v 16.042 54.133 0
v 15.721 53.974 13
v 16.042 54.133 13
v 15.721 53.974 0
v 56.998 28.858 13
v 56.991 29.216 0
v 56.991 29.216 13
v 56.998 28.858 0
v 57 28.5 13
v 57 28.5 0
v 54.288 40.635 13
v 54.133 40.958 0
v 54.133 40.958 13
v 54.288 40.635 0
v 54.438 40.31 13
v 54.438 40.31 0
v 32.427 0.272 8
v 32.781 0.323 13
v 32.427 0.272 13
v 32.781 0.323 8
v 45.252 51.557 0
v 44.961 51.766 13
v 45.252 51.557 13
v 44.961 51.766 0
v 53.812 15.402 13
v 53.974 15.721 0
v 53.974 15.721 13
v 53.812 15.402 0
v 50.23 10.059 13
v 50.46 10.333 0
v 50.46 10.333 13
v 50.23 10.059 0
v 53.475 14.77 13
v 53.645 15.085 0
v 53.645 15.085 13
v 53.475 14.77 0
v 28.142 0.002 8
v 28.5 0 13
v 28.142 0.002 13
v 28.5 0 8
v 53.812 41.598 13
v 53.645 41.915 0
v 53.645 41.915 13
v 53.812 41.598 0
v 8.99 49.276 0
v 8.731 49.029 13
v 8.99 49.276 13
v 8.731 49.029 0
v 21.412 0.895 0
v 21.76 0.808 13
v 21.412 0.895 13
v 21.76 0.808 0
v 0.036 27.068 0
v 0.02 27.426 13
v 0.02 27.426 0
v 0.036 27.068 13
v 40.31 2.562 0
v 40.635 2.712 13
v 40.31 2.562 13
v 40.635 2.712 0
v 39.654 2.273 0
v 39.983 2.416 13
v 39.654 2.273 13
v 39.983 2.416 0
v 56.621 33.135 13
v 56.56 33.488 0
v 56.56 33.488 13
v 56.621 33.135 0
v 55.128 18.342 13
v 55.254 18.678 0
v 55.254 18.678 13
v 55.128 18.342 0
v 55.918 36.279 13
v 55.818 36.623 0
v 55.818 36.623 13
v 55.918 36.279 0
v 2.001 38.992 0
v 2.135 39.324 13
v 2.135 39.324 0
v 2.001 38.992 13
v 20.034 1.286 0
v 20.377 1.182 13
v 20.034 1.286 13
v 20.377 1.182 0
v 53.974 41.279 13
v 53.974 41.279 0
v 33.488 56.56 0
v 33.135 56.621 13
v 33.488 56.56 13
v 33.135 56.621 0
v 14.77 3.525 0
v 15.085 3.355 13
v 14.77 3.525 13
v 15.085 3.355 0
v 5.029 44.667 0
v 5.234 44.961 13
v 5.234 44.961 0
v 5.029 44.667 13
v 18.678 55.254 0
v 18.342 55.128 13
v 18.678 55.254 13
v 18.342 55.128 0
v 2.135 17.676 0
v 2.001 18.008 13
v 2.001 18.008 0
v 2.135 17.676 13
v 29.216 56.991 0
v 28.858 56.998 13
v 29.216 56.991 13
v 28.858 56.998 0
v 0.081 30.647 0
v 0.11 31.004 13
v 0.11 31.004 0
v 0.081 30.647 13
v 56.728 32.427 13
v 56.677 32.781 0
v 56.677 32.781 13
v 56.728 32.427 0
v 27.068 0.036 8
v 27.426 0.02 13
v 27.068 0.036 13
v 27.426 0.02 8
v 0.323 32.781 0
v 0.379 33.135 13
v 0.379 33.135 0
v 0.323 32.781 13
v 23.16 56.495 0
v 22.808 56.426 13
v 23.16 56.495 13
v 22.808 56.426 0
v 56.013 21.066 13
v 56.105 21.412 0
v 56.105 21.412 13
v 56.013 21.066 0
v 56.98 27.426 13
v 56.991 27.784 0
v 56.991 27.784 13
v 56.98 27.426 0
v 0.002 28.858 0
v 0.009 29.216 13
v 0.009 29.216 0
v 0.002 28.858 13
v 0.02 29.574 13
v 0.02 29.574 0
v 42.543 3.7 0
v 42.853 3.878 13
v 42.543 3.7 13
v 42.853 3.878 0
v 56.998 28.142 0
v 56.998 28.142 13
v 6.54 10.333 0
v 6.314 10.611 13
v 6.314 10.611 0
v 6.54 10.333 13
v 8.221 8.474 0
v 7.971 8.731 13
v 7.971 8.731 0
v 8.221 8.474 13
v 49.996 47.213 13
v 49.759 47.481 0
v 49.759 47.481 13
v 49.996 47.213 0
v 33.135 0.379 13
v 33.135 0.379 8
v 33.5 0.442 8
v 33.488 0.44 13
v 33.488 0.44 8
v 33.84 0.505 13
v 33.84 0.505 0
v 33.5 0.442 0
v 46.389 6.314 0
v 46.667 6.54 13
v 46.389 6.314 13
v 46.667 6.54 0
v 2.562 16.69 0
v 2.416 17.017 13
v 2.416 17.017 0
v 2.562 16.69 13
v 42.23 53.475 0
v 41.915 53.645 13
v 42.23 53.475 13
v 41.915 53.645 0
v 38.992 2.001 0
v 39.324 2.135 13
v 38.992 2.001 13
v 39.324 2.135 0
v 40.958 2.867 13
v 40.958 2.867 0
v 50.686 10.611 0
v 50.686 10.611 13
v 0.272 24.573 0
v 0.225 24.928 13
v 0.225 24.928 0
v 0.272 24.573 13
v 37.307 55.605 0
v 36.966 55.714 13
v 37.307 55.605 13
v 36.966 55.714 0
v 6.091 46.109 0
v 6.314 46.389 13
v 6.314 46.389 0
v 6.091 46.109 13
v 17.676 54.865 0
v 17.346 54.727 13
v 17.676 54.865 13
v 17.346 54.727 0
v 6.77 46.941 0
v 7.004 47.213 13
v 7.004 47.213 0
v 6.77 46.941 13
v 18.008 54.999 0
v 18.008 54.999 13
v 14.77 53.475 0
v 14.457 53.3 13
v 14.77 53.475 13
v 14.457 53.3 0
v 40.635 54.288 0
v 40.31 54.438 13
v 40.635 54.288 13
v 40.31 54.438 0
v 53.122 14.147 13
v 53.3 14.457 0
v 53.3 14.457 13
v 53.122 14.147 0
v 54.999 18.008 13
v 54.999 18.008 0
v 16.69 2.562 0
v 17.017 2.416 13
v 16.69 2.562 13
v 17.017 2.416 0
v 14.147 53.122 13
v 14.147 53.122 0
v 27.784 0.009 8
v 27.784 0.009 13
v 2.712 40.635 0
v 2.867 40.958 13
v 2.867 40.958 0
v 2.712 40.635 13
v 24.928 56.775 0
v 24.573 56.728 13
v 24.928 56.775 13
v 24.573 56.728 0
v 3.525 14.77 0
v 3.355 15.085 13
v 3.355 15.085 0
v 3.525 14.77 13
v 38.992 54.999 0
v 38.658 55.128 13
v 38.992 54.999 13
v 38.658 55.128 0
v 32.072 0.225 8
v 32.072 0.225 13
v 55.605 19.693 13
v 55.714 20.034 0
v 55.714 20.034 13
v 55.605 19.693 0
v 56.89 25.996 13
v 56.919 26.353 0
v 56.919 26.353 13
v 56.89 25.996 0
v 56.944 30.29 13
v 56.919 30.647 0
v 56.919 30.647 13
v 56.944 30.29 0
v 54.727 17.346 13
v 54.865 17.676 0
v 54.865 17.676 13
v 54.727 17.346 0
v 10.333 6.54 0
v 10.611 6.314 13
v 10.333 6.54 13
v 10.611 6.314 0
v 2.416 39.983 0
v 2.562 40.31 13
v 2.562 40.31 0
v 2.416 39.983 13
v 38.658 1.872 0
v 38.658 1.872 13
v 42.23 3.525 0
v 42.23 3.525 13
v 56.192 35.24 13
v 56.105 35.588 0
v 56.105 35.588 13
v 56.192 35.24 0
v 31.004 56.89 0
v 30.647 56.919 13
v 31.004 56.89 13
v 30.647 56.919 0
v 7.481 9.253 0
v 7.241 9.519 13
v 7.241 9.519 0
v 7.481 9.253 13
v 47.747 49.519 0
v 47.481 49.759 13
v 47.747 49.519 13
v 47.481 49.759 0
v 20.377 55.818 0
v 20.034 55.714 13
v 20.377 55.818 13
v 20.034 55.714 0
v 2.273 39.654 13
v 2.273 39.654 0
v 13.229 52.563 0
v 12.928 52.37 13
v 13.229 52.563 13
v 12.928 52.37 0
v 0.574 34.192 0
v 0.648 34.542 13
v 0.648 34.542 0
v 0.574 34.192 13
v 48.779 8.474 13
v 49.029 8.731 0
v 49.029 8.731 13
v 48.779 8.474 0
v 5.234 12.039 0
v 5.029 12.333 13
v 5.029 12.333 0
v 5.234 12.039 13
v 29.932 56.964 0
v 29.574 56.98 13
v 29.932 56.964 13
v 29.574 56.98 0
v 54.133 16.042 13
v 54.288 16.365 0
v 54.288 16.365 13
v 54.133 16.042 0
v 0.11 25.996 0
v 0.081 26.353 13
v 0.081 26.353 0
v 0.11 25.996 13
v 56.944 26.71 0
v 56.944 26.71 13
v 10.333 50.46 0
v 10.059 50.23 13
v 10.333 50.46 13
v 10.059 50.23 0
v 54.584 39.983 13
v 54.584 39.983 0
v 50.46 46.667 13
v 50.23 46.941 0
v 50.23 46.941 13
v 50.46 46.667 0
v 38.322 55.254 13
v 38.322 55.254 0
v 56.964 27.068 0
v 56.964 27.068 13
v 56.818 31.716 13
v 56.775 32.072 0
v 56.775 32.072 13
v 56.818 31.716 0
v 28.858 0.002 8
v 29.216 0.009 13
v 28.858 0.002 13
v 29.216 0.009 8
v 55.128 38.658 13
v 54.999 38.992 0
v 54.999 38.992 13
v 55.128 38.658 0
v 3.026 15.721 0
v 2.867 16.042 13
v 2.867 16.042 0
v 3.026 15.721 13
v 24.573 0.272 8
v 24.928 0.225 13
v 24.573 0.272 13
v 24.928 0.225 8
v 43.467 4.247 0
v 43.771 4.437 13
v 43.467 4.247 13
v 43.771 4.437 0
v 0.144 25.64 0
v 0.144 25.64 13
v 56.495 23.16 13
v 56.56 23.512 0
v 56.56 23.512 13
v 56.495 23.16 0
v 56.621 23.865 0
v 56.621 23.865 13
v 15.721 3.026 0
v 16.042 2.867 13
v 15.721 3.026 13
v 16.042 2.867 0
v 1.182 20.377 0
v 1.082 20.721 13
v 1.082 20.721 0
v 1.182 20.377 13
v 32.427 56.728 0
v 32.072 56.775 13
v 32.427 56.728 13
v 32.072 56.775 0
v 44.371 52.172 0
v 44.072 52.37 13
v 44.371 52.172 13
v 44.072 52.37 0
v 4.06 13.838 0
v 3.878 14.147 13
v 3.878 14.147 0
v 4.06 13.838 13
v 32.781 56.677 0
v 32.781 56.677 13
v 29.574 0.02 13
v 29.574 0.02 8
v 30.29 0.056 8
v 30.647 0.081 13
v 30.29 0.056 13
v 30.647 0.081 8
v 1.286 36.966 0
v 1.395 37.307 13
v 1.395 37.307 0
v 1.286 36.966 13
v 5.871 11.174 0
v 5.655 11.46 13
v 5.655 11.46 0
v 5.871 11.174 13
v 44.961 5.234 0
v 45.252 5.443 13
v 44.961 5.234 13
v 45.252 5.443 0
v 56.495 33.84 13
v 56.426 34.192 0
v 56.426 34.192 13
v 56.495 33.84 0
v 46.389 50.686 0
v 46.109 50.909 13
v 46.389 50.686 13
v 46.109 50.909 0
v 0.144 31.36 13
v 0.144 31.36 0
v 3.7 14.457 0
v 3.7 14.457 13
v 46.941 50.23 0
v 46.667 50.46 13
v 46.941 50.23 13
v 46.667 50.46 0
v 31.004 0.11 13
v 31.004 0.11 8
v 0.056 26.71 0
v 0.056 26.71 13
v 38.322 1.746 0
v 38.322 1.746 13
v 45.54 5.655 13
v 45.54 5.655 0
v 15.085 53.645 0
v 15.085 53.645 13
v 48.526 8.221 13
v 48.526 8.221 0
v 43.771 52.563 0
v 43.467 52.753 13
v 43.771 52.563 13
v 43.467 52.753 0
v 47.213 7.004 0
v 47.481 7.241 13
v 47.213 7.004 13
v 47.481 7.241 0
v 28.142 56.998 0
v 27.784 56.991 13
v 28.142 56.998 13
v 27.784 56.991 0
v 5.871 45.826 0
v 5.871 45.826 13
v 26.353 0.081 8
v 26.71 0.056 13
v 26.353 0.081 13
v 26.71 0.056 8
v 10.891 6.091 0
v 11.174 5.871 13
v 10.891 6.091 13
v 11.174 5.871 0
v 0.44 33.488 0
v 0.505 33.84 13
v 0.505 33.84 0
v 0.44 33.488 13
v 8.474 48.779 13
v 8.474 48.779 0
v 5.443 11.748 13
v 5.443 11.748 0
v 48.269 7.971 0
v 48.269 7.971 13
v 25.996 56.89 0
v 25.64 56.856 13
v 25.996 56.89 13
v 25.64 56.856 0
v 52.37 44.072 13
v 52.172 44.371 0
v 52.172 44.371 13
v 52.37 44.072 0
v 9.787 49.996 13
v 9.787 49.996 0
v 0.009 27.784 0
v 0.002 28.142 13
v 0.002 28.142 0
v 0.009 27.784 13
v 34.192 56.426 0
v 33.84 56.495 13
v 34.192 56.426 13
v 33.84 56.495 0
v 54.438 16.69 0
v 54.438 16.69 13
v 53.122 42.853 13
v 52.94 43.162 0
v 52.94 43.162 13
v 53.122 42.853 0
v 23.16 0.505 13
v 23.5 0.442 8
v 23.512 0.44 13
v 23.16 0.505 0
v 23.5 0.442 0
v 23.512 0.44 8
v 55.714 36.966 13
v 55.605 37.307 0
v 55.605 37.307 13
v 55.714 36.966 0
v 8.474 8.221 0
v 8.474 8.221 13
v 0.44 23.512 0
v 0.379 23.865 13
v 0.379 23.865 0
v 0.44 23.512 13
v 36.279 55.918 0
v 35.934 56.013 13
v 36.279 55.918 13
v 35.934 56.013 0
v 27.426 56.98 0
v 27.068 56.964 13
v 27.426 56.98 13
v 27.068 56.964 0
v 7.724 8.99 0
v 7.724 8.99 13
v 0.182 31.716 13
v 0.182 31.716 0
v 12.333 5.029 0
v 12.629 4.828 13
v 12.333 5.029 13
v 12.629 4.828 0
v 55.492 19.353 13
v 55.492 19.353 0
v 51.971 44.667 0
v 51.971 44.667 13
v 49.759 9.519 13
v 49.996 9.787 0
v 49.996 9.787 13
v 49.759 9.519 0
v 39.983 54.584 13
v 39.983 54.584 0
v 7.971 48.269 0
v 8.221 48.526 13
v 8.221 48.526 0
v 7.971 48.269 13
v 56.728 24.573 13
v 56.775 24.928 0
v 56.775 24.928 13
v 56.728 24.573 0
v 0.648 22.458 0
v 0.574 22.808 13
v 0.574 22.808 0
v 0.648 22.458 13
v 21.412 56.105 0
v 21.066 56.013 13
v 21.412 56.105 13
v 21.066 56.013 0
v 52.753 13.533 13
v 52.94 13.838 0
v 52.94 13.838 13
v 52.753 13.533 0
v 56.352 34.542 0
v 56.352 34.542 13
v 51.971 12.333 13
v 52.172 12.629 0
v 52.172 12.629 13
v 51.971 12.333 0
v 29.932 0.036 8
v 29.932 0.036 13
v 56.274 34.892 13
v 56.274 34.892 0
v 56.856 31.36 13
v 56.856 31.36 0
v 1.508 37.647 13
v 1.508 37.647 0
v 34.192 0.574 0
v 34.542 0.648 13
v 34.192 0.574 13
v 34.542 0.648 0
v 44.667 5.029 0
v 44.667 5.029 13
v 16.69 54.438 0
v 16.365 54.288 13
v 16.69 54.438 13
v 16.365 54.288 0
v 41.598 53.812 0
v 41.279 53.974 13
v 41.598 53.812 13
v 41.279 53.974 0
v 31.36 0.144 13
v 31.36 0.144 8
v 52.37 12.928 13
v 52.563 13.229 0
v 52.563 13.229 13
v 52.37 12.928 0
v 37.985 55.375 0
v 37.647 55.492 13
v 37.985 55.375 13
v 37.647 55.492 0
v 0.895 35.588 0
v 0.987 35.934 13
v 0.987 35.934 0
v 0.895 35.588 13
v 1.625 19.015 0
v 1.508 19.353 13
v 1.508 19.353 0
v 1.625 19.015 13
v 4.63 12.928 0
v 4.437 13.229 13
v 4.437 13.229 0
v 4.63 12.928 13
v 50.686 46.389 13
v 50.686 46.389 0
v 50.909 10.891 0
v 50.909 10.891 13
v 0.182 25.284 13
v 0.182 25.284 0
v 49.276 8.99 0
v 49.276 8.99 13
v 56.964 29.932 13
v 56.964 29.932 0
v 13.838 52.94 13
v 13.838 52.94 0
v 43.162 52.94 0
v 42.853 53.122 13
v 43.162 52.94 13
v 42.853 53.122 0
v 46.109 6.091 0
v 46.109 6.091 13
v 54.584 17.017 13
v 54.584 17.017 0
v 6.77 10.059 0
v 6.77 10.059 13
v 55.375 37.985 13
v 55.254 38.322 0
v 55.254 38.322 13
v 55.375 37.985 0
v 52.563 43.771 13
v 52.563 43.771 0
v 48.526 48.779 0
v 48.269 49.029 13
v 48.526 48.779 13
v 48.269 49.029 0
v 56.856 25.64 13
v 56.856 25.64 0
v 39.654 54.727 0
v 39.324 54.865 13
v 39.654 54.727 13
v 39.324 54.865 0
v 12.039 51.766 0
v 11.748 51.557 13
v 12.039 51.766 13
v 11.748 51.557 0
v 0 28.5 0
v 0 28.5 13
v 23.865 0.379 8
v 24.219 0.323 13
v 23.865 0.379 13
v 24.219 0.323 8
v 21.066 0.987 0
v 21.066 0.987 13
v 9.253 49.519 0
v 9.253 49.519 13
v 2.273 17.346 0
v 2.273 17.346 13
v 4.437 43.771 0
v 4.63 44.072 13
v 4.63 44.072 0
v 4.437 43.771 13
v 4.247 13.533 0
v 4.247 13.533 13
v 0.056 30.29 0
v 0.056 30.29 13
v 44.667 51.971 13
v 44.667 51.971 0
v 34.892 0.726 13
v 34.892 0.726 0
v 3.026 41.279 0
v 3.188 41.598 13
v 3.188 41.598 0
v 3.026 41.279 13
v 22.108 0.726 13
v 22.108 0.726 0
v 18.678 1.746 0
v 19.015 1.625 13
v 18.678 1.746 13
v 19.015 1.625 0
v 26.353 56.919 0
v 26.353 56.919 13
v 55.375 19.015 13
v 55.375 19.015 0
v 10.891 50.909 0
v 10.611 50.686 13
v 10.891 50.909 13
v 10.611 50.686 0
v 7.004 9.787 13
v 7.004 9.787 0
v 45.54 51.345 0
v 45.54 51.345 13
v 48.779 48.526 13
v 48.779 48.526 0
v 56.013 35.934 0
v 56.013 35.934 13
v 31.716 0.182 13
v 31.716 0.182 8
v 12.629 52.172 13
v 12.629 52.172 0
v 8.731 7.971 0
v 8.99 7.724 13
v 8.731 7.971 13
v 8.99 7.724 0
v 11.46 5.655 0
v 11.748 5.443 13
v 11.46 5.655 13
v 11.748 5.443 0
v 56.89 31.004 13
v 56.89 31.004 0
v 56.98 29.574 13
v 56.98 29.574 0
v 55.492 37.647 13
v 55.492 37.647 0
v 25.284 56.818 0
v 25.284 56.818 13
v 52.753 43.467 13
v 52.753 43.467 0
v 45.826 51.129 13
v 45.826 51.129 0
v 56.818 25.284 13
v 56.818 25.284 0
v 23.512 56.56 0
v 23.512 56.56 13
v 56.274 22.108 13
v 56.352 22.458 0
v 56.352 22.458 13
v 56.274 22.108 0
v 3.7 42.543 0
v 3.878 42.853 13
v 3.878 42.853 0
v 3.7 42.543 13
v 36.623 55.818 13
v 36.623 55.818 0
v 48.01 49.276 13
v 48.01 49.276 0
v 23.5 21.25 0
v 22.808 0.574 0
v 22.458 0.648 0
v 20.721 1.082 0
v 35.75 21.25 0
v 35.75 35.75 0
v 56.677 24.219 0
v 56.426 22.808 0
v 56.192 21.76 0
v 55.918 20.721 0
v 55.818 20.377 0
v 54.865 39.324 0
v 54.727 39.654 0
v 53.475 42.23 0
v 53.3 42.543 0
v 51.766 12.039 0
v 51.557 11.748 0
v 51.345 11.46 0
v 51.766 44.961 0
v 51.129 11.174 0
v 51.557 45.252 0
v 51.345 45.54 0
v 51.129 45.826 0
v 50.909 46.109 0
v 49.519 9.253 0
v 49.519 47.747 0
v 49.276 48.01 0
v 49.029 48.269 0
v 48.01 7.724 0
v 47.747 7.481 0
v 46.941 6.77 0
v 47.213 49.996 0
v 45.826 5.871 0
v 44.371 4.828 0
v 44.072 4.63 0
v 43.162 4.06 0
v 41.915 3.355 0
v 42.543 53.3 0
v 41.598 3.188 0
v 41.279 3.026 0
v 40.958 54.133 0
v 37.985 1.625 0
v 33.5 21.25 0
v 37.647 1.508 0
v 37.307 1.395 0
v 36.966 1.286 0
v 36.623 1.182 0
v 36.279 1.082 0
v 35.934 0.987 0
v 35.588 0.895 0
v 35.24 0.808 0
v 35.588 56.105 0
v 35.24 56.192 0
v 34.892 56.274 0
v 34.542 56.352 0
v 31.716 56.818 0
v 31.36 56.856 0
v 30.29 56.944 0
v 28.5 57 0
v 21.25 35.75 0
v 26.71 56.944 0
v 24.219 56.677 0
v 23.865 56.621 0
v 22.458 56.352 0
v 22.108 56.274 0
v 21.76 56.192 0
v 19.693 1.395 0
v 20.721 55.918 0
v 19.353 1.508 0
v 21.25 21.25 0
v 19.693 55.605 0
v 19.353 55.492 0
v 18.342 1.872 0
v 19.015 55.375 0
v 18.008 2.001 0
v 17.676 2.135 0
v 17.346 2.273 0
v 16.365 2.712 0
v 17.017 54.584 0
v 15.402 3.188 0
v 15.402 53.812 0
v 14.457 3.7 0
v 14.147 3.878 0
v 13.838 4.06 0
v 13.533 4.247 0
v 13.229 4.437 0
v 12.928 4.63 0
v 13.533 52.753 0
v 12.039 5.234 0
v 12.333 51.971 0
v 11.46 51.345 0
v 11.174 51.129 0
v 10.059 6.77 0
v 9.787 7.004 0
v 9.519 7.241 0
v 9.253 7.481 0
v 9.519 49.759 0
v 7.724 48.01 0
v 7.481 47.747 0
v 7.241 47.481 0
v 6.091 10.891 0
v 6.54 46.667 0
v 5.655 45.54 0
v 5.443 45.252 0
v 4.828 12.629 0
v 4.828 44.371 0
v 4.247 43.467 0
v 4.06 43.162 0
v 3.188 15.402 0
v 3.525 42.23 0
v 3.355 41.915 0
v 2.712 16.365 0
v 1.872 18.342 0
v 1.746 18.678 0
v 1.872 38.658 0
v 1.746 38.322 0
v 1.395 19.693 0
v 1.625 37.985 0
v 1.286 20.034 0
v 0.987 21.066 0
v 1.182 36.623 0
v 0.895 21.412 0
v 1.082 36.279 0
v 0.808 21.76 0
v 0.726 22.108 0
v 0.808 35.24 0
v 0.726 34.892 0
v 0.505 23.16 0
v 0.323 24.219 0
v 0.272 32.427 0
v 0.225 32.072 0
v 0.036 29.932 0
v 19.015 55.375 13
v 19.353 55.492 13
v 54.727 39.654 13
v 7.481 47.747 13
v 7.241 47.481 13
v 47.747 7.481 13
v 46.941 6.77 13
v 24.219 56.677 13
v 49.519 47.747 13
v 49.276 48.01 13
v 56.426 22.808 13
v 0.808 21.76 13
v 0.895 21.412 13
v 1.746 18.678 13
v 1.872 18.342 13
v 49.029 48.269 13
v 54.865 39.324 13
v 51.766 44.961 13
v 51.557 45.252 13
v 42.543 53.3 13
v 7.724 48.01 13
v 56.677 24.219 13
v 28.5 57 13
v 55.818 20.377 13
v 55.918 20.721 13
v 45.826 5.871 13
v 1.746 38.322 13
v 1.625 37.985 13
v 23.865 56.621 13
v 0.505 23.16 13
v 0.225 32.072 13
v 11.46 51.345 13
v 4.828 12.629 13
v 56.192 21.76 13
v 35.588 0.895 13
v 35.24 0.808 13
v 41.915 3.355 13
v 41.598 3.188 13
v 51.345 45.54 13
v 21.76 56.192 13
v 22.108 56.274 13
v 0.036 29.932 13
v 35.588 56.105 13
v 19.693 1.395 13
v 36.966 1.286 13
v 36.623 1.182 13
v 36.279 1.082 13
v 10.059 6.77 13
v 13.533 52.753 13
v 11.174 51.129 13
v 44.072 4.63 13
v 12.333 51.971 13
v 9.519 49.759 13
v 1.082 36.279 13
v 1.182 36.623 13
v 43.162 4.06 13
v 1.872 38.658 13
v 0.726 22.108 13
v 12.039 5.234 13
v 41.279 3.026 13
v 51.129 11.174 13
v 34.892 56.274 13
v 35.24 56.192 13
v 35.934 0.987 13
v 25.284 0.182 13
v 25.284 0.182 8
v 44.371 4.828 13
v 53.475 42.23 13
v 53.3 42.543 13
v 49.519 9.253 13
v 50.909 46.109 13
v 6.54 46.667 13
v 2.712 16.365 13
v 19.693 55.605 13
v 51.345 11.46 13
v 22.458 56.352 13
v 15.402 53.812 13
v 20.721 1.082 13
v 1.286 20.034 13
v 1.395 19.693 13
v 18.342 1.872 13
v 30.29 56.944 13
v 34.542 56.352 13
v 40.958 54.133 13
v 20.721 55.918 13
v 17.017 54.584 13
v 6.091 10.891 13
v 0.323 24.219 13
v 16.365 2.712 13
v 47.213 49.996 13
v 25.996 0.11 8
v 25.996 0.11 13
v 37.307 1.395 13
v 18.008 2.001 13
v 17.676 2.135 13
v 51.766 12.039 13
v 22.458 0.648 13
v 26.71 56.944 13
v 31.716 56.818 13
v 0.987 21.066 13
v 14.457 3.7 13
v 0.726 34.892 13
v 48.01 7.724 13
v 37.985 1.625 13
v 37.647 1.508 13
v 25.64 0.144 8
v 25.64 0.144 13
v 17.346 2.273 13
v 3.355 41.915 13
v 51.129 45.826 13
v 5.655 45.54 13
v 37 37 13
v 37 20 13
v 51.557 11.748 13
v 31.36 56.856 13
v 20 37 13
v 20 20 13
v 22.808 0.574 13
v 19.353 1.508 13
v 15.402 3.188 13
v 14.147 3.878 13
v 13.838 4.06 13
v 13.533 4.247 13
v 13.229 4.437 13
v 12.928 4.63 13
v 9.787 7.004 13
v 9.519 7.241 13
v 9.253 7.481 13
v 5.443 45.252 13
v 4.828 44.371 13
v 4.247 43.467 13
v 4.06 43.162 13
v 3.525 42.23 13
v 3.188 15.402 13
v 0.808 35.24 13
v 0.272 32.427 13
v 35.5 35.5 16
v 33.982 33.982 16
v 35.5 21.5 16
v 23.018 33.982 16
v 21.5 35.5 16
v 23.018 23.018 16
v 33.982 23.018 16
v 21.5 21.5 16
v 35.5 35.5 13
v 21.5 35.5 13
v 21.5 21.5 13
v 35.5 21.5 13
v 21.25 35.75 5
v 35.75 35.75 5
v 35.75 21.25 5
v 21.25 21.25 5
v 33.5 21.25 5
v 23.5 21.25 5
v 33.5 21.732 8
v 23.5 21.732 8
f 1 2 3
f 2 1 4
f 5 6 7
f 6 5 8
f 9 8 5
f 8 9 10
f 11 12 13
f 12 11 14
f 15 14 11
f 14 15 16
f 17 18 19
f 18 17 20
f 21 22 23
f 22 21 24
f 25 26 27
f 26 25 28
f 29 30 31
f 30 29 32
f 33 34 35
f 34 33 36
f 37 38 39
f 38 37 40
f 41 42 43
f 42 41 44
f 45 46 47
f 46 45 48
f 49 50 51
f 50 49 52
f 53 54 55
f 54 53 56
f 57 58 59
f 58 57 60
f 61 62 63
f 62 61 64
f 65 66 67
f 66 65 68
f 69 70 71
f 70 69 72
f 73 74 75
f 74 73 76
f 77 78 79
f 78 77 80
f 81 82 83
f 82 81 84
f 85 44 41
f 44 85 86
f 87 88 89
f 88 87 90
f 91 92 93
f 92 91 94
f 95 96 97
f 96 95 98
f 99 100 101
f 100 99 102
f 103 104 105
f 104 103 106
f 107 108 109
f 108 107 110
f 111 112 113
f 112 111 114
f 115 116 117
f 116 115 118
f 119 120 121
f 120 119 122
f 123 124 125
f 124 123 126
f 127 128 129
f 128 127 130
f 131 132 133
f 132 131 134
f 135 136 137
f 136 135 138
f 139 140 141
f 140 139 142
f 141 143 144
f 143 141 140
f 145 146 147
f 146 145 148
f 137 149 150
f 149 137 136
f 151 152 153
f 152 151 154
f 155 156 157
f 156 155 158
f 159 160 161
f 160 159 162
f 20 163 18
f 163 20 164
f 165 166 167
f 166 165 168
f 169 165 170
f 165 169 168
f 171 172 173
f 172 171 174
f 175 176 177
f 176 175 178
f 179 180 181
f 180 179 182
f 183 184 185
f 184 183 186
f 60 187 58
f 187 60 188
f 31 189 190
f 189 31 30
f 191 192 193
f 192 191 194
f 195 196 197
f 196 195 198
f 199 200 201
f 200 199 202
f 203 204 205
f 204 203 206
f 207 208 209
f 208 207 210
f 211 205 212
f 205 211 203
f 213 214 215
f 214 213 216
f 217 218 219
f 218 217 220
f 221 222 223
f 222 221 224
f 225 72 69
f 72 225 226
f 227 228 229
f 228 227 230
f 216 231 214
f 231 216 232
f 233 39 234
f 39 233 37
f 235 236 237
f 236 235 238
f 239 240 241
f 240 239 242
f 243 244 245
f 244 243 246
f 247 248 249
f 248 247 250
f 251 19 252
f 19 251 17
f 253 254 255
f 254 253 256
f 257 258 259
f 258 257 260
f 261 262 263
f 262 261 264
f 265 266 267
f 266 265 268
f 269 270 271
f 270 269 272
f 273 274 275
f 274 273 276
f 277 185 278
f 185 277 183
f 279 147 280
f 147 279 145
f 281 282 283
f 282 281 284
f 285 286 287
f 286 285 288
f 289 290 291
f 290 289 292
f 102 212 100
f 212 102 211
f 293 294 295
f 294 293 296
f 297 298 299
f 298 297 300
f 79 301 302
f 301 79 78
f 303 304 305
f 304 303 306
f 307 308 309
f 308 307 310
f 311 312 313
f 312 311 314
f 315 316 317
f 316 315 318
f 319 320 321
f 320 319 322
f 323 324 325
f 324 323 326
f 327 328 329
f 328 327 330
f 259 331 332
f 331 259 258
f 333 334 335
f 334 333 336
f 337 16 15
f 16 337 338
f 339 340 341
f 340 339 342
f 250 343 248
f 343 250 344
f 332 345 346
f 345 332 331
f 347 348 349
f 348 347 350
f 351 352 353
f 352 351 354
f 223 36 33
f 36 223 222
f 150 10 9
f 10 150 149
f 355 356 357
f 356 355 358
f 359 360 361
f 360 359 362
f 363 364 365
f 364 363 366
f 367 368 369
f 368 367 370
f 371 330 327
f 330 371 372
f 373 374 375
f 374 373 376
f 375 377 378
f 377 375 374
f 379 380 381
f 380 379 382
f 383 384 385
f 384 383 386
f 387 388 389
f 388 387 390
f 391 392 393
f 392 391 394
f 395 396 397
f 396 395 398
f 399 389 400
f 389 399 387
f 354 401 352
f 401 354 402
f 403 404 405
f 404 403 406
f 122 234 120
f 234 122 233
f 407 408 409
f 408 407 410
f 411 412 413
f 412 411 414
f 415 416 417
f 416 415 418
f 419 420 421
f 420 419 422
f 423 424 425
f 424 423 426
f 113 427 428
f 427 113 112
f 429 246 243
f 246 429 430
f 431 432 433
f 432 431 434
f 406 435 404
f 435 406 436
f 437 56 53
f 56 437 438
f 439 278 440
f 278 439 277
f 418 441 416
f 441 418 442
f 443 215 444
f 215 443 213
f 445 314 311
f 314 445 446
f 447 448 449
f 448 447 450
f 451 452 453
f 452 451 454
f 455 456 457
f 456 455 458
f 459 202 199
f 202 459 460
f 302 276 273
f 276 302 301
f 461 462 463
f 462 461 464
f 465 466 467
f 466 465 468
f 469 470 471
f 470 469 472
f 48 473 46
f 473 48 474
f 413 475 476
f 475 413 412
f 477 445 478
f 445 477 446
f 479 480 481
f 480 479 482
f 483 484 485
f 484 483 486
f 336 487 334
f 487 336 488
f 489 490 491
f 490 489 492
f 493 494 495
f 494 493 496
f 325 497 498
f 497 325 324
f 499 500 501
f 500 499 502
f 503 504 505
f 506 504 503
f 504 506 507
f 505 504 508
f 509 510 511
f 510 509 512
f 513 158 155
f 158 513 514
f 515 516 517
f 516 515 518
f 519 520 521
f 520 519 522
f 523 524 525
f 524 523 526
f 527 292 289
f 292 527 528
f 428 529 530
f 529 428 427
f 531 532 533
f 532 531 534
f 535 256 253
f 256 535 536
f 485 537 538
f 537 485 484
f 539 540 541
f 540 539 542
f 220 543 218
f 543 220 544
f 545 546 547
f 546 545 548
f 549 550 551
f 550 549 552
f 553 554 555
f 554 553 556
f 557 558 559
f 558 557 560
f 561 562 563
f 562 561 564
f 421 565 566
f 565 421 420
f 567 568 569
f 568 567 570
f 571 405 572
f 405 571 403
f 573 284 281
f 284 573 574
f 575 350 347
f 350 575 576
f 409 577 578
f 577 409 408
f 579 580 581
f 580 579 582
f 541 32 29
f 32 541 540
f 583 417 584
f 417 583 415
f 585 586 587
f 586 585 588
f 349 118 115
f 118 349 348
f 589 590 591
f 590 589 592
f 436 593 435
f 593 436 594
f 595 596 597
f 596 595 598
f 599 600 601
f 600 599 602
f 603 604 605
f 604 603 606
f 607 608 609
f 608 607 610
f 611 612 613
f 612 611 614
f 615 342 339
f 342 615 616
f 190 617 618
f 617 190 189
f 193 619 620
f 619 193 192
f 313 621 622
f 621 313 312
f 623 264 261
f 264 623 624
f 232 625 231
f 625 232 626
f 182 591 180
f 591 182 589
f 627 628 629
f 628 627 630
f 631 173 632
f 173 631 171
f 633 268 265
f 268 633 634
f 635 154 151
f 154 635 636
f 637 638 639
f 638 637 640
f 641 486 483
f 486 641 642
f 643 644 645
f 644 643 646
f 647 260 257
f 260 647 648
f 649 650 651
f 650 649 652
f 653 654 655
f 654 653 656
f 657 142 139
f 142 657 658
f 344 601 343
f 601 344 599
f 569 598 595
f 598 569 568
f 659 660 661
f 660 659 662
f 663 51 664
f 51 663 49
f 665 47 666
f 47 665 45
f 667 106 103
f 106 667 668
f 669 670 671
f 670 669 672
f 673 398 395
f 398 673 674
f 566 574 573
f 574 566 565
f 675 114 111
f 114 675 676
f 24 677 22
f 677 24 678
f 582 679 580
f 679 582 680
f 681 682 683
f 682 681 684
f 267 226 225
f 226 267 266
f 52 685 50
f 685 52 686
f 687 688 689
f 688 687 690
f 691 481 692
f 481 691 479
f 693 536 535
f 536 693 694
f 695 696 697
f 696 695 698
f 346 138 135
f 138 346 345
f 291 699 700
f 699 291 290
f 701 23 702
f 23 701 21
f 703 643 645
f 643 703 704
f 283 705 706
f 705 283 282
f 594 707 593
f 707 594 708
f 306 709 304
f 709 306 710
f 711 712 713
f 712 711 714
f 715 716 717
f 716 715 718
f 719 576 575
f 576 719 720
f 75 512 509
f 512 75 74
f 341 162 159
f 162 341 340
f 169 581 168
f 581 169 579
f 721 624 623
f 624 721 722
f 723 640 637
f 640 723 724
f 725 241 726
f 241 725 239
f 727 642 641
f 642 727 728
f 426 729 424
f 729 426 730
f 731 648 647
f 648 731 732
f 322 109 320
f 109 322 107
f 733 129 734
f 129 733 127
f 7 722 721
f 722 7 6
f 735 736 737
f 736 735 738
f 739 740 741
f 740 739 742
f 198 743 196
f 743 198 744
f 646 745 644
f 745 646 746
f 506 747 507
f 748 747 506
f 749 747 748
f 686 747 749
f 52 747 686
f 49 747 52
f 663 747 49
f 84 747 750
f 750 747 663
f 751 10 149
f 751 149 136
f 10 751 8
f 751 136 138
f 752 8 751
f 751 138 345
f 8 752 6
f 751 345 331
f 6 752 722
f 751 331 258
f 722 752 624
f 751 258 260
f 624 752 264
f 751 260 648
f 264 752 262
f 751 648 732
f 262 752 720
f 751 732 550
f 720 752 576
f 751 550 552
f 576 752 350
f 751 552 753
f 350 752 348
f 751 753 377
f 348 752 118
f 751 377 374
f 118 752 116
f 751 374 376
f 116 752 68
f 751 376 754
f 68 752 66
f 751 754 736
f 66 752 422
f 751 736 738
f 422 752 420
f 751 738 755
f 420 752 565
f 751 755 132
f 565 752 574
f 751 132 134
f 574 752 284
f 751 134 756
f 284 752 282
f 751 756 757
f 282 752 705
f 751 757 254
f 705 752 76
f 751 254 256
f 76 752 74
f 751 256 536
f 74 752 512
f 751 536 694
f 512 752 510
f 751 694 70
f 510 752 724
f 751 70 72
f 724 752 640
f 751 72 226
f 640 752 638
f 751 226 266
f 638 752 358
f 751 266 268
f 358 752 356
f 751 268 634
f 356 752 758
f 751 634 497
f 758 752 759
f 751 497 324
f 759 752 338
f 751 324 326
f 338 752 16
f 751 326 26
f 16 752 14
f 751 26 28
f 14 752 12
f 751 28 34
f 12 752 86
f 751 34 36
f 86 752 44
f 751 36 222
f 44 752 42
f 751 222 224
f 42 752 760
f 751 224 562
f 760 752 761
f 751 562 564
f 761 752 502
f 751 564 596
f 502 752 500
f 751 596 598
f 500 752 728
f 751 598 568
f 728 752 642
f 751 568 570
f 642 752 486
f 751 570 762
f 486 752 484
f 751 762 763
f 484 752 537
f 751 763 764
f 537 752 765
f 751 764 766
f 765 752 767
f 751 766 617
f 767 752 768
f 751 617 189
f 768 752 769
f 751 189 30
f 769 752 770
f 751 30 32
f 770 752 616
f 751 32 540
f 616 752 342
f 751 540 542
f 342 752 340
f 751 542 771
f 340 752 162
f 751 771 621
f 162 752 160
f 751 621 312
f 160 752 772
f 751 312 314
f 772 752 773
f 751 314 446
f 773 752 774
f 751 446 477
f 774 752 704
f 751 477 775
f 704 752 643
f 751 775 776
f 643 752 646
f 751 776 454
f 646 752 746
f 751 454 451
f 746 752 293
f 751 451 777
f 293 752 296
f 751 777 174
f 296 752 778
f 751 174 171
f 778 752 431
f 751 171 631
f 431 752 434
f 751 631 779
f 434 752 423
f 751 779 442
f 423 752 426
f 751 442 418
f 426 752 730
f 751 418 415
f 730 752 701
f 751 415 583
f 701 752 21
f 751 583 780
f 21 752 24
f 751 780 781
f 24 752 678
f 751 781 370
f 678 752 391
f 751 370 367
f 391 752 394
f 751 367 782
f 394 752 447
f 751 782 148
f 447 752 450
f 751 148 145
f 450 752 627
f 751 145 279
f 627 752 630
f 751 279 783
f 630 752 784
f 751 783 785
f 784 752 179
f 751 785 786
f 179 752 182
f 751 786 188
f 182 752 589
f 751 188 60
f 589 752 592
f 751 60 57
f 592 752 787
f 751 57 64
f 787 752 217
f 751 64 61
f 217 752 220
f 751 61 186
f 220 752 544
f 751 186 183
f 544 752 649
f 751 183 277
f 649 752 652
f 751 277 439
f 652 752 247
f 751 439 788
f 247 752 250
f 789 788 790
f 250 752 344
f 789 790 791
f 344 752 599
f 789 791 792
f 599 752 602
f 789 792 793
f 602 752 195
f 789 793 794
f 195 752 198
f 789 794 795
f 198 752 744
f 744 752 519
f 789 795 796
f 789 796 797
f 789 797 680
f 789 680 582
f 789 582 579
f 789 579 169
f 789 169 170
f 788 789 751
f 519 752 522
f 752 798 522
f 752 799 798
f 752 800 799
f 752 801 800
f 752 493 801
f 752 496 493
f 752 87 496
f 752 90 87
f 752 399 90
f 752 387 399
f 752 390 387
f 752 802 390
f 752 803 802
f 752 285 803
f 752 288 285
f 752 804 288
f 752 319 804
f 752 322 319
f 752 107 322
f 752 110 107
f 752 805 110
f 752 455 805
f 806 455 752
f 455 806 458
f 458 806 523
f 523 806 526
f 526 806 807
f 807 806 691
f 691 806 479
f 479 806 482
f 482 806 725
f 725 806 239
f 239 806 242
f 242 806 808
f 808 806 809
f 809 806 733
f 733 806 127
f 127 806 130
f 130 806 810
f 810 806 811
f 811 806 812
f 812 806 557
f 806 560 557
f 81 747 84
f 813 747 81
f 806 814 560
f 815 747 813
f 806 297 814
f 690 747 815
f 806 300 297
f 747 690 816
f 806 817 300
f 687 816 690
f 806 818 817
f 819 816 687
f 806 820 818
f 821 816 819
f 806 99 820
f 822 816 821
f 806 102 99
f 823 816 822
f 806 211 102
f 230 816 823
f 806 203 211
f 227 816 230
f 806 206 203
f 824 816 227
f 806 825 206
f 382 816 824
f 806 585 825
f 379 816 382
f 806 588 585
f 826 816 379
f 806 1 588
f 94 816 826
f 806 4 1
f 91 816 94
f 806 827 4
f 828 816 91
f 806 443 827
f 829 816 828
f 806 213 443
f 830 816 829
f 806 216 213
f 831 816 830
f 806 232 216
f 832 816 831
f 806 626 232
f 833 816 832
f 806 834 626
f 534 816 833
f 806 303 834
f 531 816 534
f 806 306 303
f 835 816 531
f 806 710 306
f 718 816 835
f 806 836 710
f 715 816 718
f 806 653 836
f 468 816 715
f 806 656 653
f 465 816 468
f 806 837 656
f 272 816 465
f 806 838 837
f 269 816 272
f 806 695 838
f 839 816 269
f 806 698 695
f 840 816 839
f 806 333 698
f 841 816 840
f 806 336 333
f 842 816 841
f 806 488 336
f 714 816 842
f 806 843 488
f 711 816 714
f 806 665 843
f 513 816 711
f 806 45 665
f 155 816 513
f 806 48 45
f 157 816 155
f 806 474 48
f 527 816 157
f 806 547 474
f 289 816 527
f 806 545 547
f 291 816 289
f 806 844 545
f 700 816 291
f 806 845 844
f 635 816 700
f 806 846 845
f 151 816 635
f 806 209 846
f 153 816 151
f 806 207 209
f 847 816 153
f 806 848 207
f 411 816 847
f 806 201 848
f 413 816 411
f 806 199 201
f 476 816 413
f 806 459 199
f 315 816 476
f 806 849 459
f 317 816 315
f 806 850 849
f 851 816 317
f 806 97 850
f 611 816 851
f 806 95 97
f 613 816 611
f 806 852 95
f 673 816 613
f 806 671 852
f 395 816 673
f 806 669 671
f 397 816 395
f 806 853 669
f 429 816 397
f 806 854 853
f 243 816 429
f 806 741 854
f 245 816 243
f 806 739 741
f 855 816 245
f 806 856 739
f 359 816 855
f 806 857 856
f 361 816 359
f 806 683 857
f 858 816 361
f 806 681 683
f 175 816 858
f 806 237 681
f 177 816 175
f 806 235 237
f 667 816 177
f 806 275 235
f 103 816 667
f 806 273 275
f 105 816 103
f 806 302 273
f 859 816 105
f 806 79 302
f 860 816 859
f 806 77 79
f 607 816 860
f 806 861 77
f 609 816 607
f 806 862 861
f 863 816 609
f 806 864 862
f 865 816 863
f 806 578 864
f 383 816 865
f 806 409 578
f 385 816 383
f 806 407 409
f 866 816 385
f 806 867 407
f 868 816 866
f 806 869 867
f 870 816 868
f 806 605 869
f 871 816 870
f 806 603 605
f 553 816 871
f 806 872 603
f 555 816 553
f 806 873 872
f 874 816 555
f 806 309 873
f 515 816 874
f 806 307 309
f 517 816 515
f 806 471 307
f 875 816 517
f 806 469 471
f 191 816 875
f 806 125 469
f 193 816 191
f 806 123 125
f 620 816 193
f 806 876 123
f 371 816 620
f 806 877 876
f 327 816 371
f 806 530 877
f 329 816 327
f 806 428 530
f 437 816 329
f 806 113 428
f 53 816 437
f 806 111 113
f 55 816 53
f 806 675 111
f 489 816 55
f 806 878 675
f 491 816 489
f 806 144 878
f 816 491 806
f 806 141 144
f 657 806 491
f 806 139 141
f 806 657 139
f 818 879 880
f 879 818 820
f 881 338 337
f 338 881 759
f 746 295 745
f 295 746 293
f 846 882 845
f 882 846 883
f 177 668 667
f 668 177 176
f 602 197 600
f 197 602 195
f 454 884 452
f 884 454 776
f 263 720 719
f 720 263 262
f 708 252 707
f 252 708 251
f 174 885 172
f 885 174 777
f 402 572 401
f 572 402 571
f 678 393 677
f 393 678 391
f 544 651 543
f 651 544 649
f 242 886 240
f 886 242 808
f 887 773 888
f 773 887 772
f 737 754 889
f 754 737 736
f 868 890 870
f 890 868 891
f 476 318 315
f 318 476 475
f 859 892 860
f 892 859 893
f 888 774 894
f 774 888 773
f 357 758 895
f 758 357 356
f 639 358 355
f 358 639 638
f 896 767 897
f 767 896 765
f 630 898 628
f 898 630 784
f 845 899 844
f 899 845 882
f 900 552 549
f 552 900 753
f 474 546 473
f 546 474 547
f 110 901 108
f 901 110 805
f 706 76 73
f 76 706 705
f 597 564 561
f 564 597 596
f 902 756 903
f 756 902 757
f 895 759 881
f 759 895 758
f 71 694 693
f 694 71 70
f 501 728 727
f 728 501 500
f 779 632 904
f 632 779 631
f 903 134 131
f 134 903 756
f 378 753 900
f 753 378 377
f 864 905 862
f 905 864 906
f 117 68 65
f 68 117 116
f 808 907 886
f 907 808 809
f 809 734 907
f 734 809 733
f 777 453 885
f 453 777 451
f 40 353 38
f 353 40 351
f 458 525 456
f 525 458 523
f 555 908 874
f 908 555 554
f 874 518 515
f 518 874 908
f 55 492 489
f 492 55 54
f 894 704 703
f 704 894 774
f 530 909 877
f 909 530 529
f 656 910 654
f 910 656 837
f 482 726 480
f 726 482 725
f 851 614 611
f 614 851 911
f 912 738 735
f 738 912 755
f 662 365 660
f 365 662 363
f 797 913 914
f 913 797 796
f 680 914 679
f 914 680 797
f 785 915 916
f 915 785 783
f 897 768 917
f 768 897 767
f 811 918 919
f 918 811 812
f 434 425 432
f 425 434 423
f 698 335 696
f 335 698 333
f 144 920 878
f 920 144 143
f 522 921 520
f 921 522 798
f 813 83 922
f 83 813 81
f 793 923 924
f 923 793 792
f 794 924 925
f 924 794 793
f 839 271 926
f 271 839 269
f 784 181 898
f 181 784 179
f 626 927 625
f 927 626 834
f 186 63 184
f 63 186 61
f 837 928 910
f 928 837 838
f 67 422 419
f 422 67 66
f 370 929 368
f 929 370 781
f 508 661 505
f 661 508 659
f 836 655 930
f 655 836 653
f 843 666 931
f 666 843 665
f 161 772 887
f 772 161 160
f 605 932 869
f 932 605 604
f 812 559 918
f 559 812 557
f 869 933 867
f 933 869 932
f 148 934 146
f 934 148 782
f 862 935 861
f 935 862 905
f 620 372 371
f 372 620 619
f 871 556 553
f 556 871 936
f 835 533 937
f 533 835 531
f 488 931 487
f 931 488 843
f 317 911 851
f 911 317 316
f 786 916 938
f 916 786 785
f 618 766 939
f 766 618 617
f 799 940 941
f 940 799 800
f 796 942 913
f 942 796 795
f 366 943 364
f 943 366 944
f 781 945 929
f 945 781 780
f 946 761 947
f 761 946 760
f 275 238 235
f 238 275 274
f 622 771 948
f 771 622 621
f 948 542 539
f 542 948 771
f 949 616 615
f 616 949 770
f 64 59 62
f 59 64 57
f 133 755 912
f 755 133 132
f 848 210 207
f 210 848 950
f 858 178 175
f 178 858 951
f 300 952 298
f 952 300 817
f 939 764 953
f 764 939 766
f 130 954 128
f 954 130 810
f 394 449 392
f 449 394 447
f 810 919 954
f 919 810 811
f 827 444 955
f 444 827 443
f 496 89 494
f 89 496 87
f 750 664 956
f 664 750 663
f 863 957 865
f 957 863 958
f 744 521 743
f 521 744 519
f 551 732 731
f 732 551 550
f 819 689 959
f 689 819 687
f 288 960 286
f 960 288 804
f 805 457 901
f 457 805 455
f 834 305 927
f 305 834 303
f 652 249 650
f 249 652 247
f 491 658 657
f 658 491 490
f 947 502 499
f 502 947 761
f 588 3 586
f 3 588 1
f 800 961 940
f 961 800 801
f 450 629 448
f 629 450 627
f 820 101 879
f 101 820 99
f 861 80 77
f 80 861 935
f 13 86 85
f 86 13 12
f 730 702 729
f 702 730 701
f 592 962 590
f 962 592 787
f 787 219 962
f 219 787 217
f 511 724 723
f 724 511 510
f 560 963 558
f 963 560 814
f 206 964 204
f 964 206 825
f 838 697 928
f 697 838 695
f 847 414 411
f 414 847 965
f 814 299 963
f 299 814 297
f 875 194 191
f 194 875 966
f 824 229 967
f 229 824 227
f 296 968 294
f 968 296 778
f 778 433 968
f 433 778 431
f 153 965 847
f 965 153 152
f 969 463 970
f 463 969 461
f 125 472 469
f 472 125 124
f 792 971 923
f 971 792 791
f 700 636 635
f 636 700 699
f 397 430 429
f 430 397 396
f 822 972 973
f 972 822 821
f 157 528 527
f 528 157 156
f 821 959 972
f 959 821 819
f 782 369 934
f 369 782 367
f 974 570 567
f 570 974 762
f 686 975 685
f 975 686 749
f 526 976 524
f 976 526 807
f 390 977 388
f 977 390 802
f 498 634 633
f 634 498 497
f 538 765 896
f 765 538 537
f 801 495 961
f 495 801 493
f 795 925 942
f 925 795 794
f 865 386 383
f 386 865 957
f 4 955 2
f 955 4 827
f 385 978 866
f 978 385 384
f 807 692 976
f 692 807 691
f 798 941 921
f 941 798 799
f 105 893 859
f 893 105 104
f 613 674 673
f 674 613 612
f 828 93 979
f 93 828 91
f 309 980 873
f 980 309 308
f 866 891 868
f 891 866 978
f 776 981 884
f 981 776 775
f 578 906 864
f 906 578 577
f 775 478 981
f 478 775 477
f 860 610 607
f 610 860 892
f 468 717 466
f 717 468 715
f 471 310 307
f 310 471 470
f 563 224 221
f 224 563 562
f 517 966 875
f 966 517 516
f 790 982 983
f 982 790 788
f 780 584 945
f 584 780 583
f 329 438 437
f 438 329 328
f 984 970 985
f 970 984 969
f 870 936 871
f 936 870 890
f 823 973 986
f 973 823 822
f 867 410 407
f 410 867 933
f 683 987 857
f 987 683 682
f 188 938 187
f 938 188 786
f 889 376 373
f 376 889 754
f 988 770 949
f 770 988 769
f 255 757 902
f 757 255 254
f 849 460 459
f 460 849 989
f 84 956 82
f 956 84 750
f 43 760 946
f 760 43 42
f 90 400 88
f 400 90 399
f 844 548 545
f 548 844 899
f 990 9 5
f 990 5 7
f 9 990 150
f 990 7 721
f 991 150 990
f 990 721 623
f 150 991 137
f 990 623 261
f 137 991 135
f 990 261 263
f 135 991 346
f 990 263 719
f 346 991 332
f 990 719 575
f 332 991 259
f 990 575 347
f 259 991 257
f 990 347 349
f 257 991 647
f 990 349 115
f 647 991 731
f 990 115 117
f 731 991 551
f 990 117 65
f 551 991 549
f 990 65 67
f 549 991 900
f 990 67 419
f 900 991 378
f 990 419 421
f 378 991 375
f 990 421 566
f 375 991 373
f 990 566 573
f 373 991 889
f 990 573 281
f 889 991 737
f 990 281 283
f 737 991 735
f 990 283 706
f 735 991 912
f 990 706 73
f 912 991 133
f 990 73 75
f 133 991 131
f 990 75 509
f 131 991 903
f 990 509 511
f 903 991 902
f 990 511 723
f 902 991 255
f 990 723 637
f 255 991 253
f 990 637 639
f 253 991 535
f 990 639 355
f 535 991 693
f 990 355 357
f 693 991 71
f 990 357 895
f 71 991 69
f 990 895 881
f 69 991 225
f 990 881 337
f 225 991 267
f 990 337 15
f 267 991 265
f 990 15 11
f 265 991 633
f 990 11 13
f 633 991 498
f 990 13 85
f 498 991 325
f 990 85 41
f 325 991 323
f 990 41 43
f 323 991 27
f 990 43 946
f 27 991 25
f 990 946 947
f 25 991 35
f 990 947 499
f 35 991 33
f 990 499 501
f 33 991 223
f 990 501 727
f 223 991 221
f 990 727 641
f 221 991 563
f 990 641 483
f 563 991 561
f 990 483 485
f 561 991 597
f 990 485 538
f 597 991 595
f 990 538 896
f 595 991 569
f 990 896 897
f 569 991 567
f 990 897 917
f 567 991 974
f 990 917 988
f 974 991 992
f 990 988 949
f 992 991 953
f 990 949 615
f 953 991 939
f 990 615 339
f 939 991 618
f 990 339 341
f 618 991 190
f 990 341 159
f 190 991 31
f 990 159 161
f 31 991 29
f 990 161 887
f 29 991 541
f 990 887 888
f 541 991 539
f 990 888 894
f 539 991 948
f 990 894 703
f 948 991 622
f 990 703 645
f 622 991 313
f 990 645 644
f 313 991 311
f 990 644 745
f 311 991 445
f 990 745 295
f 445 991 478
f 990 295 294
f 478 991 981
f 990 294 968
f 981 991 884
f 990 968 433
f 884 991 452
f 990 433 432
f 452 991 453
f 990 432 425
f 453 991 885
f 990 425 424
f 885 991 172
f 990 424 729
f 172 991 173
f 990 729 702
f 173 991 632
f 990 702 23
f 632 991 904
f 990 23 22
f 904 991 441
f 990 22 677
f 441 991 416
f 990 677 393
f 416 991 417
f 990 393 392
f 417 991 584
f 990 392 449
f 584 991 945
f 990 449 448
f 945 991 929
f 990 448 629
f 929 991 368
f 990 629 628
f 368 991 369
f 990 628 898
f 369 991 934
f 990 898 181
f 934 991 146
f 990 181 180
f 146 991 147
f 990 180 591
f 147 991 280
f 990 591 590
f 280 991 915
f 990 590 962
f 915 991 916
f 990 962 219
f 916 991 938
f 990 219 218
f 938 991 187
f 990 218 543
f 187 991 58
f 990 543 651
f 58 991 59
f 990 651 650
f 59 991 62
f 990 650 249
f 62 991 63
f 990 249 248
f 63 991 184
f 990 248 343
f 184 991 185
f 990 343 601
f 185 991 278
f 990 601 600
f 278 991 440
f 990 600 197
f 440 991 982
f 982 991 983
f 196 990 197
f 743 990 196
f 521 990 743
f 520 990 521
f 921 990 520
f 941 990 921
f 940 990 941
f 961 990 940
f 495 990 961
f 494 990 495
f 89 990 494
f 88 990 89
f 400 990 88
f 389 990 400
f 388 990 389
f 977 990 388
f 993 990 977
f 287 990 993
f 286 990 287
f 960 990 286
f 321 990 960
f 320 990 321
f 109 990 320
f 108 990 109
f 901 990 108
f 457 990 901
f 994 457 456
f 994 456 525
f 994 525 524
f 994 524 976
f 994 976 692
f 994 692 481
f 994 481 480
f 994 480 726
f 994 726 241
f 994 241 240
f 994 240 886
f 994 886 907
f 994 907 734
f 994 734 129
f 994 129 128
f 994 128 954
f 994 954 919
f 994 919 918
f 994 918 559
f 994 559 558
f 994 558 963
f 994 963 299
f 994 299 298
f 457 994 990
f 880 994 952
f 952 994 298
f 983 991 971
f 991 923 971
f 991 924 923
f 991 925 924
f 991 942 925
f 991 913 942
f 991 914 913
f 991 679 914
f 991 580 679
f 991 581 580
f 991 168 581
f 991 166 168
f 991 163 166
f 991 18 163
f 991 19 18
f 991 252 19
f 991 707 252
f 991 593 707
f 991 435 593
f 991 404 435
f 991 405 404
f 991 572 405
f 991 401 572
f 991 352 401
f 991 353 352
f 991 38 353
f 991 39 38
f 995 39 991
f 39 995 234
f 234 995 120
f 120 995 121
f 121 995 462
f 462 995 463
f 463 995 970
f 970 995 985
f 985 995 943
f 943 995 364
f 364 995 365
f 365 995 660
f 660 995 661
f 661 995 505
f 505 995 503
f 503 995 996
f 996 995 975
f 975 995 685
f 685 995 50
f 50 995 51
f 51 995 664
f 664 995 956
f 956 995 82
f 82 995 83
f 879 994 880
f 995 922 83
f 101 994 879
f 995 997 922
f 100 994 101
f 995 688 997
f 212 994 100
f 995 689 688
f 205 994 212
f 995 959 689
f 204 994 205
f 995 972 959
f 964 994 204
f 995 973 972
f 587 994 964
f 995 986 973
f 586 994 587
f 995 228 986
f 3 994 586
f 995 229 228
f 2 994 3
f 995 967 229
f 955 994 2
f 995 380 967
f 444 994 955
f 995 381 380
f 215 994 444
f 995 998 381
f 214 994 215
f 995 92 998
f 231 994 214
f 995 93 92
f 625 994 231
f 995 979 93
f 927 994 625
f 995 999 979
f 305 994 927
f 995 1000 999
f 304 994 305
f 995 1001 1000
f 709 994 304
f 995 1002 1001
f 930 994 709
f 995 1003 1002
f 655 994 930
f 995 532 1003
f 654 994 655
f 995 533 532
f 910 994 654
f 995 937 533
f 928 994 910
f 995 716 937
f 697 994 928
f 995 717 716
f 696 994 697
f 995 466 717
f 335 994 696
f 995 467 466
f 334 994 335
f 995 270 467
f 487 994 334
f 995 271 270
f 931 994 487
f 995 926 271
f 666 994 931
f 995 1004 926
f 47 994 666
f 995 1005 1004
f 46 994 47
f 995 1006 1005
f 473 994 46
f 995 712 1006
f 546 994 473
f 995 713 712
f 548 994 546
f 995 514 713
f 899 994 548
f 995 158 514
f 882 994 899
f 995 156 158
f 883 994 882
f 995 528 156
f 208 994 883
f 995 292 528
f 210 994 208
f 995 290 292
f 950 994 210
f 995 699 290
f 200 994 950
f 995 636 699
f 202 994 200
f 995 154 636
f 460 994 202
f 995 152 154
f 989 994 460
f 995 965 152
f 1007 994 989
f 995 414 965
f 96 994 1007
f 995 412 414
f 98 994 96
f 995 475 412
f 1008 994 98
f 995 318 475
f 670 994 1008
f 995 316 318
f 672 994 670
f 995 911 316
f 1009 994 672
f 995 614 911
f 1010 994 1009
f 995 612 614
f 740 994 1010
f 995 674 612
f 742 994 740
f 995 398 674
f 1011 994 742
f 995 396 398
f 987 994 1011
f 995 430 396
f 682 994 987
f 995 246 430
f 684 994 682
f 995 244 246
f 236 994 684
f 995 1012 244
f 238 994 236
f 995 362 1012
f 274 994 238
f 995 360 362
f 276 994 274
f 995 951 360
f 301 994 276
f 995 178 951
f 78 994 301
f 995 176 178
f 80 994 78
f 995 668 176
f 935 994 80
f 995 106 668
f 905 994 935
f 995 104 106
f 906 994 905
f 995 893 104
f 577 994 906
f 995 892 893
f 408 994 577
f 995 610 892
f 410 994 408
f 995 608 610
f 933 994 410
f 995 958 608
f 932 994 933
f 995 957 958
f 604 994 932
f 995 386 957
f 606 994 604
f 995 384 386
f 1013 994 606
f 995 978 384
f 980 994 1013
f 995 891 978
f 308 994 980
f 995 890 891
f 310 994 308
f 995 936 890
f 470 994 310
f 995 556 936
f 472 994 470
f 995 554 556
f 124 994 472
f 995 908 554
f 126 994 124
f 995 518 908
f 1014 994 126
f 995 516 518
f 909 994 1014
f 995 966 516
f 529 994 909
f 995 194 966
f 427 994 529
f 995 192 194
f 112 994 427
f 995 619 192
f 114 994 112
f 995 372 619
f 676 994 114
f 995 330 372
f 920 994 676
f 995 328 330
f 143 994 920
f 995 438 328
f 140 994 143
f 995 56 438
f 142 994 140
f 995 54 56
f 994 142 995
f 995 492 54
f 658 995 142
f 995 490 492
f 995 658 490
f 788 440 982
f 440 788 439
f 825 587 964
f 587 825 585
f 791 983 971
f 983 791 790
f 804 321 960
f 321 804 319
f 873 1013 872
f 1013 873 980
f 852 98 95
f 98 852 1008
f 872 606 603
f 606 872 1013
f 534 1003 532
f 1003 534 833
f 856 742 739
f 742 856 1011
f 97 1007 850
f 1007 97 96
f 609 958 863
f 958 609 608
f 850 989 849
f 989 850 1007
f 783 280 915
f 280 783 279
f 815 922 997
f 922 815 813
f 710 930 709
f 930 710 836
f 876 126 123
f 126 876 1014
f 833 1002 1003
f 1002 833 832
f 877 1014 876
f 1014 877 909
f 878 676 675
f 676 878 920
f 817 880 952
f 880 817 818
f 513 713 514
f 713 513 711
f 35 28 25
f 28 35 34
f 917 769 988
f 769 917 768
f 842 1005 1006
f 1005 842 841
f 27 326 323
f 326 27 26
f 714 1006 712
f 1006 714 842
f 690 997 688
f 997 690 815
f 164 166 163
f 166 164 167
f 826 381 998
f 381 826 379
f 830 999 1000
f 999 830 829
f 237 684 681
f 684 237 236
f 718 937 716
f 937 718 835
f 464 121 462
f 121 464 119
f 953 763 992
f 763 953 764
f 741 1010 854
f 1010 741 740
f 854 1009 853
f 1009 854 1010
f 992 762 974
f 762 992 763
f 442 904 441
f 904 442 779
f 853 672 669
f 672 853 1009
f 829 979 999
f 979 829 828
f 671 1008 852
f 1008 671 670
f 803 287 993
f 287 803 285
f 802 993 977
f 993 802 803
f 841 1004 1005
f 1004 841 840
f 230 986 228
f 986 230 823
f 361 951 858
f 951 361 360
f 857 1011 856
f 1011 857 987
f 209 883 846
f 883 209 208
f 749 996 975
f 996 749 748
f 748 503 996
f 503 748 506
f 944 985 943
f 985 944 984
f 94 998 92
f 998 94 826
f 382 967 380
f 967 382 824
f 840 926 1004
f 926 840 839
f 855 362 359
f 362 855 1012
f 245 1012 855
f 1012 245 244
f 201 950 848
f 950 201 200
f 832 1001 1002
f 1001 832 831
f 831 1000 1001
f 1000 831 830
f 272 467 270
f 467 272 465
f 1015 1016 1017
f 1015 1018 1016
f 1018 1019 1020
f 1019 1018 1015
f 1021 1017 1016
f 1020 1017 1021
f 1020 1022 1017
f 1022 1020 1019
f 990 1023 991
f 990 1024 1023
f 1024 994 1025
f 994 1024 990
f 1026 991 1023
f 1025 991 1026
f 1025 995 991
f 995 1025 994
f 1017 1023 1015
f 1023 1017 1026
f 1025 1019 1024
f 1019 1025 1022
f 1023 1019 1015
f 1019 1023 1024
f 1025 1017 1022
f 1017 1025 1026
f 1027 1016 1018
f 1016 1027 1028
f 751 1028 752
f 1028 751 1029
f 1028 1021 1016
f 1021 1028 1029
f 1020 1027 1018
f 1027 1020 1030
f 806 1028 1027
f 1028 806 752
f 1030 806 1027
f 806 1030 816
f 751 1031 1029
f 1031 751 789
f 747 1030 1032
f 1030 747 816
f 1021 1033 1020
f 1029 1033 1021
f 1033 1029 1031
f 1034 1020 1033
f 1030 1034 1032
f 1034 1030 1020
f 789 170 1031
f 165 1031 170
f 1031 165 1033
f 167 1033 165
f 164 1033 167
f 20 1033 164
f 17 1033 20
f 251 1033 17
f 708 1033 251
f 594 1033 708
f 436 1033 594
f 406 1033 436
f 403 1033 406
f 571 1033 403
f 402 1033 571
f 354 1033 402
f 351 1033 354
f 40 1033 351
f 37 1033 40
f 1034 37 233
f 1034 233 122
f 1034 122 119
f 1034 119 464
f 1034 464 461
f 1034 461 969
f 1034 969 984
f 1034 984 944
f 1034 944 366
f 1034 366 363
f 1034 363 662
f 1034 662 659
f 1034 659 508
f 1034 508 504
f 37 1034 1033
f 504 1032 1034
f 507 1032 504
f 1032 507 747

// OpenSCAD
$fn=500;
width=17;
outerWidth=57;
wallWidth=2;
tabWidth=2;
hd=0.5; // holder distance

module centerCube()
{
	hull()
	{
		translate([2.25,2.25,18]) cube([10,10,1]);
		cube([14.5,14.5,5]);
	}
	
}


module mainCube()
{
	diff = outerWidth - width;
	offset = diff/2;
	innerWidth = width - (wallWidth*2);
	
	difference()
	{
		union()
		{
			translate([outerWidth/2,outerWidth/2,0]) cylinder(d=outerWidth,13);
			color("blue") translate([offset,offset,0]) cube([width,width,16]);
		}
		
		
		translate([offset+1.25,offset+1.25,0]) centerCube();
		//translate([offset-wallWidth,offset+(wallWidth),6]) rotate([0,0,-45]) cube([wallWidth*3,wallWidth*5,15]);
		translate([offset,offset,13]) difference()
		{
		cube([width,width,3]);
		translate([wallWidth-0.5, wallWidth-0.5,0]) cube([width-(wallWidth*2)+1,width-(wallWidth*2)+1,3]);
		}
		translate([(outerWidth/2)-5,0,0]) cube([10,30,8]);
		
	}
	
}

mainCube();
